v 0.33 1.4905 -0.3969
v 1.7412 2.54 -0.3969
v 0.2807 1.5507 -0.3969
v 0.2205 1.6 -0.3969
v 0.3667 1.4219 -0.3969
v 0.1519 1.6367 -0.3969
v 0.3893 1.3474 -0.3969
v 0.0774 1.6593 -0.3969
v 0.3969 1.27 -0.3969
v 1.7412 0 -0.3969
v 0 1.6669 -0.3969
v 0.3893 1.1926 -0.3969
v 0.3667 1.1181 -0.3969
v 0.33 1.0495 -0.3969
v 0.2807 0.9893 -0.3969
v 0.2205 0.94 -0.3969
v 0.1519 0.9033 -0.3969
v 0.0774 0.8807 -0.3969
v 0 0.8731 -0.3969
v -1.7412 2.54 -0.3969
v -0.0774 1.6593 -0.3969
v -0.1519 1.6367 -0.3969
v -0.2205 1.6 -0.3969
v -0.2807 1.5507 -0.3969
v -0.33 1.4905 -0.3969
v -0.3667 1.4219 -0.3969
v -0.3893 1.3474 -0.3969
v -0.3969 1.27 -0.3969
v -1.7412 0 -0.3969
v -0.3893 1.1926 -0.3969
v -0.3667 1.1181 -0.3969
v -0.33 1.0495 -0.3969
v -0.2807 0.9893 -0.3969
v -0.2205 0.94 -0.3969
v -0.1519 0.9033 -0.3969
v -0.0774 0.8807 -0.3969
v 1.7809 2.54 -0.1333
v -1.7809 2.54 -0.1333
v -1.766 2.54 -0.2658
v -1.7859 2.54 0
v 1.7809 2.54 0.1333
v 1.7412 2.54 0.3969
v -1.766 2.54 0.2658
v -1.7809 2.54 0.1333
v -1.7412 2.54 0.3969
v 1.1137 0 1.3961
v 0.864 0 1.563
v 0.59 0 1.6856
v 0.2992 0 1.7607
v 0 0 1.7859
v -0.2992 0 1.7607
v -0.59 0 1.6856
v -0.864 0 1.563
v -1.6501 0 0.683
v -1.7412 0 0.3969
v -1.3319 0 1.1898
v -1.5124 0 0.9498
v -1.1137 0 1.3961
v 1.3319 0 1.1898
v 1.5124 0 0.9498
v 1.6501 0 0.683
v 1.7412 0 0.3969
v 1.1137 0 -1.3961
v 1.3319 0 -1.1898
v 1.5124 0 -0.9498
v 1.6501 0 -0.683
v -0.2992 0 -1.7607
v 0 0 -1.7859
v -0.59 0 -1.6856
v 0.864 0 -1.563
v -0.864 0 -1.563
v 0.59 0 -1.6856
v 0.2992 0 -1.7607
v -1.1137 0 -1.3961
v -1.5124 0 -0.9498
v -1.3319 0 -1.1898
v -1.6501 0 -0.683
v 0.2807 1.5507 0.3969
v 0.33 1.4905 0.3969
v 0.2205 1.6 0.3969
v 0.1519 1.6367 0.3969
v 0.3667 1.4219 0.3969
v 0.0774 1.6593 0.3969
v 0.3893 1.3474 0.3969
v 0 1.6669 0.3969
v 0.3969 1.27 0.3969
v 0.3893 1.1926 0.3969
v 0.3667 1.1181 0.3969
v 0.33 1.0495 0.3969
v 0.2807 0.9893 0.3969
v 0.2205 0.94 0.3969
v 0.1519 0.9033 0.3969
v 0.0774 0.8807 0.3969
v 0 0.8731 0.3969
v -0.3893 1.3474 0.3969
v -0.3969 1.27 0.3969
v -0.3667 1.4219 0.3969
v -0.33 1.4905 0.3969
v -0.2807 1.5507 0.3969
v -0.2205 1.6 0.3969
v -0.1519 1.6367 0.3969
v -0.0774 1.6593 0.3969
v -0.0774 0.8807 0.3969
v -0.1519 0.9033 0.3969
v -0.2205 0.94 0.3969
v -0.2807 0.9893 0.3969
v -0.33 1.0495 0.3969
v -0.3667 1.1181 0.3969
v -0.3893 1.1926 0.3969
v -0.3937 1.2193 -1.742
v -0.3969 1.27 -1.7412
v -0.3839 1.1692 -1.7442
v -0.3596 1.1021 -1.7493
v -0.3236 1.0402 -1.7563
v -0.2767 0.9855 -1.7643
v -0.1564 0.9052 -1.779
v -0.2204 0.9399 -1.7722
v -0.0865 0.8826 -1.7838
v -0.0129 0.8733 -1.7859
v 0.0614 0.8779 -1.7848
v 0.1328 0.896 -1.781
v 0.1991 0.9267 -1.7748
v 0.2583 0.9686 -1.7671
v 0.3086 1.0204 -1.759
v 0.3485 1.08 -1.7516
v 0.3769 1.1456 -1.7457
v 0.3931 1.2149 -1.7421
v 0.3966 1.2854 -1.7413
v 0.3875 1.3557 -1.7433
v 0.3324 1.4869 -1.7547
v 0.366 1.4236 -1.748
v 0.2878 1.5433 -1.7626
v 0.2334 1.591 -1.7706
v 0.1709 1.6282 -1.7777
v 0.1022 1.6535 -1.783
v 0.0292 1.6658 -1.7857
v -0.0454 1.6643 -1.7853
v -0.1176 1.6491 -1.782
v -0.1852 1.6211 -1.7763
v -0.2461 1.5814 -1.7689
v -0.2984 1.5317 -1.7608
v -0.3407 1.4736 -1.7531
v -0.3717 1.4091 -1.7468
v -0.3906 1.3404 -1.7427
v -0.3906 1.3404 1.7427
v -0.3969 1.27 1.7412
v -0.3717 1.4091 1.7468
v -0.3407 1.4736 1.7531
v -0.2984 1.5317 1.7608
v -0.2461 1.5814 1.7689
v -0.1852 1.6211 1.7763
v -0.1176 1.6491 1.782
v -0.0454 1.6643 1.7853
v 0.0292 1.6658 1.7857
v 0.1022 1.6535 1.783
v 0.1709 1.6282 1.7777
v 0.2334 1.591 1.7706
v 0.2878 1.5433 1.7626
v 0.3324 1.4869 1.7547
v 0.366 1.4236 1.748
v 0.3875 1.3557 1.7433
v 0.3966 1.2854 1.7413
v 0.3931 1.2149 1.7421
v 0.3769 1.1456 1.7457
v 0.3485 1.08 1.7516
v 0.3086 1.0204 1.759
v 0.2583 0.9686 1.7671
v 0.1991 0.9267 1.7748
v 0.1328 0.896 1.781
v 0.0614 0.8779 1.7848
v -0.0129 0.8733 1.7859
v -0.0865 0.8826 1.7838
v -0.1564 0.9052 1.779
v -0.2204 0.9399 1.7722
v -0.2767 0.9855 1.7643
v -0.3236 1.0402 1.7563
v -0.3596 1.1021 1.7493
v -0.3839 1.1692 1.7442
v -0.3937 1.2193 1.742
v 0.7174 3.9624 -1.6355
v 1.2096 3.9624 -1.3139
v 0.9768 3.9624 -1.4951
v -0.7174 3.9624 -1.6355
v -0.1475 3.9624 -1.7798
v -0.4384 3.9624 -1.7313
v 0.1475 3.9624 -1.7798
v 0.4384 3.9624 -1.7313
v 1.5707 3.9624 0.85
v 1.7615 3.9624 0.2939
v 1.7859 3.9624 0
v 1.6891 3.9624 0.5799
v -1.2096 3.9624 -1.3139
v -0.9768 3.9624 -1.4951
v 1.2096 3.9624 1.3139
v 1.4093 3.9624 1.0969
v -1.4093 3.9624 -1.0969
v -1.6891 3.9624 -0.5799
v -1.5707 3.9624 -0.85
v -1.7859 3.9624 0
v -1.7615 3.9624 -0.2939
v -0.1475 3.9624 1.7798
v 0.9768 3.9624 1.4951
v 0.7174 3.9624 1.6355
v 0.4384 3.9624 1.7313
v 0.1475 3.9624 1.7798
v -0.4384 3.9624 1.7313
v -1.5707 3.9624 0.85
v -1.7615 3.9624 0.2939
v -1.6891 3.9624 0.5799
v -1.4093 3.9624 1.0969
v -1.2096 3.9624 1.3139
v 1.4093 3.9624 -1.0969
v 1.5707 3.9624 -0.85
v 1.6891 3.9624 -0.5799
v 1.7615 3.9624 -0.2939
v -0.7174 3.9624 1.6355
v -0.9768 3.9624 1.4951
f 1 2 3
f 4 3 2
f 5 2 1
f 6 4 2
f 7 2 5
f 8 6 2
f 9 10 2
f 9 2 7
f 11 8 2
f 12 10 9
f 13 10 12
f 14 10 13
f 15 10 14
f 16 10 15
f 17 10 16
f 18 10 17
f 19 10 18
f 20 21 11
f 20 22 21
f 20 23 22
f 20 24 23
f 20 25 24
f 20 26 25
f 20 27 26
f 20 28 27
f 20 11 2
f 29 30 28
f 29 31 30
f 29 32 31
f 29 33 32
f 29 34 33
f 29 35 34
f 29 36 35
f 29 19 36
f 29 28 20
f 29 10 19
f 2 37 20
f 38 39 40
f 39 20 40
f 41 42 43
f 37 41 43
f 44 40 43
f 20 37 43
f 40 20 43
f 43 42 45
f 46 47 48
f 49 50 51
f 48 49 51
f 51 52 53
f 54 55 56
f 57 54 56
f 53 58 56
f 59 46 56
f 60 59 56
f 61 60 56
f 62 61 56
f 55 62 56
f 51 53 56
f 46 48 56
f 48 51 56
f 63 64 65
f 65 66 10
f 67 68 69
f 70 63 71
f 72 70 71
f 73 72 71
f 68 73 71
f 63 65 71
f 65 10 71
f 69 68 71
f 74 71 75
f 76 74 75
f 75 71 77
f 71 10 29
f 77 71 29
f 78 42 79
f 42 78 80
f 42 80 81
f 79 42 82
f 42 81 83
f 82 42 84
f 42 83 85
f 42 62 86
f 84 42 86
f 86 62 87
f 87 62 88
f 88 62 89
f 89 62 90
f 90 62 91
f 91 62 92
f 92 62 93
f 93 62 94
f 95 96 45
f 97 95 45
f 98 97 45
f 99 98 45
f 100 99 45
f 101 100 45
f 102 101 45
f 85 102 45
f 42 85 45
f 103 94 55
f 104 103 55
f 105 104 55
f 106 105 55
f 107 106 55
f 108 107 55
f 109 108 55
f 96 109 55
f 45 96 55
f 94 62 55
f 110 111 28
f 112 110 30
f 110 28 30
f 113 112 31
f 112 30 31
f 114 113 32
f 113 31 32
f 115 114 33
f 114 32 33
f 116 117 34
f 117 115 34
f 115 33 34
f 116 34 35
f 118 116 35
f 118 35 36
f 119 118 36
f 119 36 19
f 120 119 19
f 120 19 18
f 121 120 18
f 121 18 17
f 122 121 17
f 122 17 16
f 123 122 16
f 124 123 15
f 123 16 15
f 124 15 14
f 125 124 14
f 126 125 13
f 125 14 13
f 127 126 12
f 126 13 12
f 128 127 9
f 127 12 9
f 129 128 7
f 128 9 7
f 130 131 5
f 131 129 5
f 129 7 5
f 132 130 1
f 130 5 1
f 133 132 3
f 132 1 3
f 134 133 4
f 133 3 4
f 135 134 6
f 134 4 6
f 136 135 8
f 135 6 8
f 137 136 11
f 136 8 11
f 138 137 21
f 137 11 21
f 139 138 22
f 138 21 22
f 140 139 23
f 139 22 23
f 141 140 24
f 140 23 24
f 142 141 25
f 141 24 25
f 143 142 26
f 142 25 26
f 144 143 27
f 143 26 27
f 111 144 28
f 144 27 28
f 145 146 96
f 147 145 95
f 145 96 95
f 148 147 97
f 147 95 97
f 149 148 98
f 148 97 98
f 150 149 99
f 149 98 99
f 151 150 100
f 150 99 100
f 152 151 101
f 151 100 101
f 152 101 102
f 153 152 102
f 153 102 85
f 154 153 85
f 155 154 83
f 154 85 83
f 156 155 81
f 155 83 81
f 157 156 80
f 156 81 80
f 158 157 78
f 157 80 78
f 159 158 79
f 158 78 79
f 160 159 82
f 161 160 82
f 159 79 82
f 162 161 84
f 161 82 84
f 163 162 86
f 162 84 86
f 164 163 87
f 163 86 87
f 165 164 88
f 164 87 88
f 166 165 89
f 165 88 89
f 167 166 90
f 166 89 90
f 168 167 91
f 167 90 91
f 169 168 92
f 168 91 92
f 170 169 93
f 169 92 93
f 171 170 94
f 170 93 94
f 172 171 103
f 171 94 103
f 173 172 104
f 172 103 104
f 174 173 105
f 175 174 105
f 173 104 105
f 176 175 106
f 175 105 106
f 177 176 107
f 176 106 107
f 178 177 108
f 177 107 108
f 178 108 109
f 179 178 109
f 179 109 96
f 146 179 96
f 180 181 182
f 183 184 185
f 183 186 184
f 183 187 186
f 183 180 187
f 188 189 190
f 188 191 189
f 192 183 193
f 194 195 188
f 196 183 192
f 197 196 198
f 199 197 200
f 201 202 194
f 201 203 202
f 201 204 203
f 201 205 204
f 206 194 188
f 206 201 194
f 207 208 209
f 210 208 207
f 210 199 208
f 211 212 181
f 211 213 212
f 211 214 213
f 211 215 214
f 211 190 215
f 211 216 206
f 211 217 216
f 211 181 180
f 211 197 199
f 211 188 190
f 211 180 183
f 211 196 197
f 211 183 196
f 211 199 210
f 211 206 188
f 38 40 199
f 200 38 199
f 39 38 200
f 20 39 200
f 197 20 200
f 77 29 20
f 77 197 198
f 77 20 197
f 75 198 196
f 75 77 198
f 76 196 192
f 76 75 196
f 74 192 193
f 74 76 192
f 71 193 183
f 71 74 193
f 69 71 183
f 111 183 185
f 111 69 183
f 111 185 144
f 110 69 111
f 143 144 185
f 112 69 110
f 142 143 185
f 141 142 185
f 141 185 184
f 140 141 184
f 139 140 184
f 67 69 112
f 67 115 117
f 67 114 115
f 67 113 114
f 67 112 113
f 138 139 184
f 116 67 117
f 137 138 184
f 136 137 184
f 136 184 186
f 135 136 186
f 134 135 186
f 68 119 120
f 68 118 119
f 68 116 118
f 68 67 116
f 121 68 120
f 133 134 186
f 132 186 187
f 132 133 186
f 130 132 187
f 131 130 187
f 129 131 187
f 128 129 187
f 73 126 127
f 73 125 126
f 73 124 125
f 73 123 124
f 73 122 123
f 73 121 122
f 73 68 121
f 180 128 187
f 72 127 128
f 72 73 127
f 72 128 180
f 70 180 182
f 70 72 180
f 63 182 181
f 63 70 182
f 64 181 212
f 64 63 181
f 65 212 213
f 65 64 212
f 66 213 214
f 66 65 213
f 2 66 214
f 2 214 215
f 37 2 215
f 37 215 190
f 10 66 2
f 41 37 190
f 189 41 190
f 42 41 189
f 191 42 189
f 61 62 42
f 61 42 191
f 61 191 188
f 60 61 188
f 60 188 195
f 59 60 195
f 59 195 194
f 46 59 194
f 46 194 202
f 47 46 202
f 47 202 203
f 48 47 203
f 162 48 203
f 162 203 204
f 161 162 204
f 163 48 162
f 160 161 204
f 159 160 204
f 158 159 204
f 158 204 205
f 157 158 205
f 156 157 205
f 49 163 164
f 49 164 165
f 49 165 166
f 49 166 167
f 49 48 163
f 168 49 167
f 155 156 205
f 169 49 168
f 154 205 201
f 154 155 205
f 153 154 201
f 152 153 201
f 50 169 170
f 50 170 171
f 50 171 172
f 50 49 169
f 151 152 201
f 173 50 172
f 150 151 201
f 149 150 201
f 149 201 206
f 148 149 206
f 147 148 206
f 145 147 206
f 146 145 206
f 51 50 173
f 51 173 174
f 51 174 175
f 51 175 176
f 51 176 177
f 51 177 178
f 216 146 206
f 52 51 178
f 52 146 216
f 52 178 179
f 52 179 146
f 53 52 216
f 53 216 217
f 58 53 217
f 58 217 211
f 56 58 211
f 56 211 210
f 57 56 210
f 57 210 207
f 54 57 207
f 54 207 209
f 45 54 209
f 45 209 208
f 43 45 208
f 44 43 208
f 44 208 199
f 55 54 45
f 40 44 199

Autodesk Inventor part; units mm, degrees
ref_plane "YZ Plane" through (0, 0, 0) normal (1, 0, 0) x (0, 1, 0)
ref_plane "XZ Plane" through (0, 0, 0) normal (0, 1, 0) x (-1, 0, 0)
ref_plane "XY Plane" through (0, 0, 0) normal (0, 0, 1) x (1, 0, 0)
sketch "Sketch1" plane through (0, 0, 0) normal (0, 1, 0) x (-1, 0, 0)
  circle A0 centre (0, 0) radius 1.7859
  circle A1 centre (0, 0) radius 2.3813
  line L0 (0, 0) -> (0, -0.3969)
  line L1 (0, -0.3969) -> (0, 0.3969)
  line L2 (0, 0.3969) -> (-2.3479, 0.3969)
  line L3 (-1.8581, 0.3969) -> (2.3479, 0.3969)
  line L4 (0, -0.3969) -> (2.3479, -0.3969)
  line L5 (1.8199, -0.3969) -> (-2.3479, -0.3969)
  point P0 (-1.7413, -0.3969)
  point P1 (1.7413, -0.3969)
  point P2 (1.7413, 0.3969)
  point P3 (-1.7413, 0.3969)
  dimension "d1" = 3.5719
  dimension "d2" = 4.7625
  dimension "d3" = 0.3969
  dimension "d4" = 0.7937
extrude "Extrusion1" add sketch "Sketch1" along normal blind 3.9624 contours A0 L4 L0 L1 L3 | L3 L2 A0 | A0 L5 L4 | L2 L1 L0 L5 A0
extrude "Extrusion2" cut sketch "Sketch1" along normal blind 2.54 contours A0 L4 L0 L1 L3 | L2 L1 L0 L5 A0
sketch "Sketch2" plane through (1.7413, 0, 0.3969) normal (0, 0, -1) x (-1, 0, 0)
  circle A0 centre (1.7413, 1.27) radius 0.3969
  line L0 (3.4826, 0) -> (0, 0) projected
  point P0 (1.7413, 0)
  dimension "d9" = 0.7937
  dimension "d10" = 1.27
extrude "Extrusion3" cut sketch "Sketch2" along normal mid plane 25.4
properties part number "Piston Connector"
